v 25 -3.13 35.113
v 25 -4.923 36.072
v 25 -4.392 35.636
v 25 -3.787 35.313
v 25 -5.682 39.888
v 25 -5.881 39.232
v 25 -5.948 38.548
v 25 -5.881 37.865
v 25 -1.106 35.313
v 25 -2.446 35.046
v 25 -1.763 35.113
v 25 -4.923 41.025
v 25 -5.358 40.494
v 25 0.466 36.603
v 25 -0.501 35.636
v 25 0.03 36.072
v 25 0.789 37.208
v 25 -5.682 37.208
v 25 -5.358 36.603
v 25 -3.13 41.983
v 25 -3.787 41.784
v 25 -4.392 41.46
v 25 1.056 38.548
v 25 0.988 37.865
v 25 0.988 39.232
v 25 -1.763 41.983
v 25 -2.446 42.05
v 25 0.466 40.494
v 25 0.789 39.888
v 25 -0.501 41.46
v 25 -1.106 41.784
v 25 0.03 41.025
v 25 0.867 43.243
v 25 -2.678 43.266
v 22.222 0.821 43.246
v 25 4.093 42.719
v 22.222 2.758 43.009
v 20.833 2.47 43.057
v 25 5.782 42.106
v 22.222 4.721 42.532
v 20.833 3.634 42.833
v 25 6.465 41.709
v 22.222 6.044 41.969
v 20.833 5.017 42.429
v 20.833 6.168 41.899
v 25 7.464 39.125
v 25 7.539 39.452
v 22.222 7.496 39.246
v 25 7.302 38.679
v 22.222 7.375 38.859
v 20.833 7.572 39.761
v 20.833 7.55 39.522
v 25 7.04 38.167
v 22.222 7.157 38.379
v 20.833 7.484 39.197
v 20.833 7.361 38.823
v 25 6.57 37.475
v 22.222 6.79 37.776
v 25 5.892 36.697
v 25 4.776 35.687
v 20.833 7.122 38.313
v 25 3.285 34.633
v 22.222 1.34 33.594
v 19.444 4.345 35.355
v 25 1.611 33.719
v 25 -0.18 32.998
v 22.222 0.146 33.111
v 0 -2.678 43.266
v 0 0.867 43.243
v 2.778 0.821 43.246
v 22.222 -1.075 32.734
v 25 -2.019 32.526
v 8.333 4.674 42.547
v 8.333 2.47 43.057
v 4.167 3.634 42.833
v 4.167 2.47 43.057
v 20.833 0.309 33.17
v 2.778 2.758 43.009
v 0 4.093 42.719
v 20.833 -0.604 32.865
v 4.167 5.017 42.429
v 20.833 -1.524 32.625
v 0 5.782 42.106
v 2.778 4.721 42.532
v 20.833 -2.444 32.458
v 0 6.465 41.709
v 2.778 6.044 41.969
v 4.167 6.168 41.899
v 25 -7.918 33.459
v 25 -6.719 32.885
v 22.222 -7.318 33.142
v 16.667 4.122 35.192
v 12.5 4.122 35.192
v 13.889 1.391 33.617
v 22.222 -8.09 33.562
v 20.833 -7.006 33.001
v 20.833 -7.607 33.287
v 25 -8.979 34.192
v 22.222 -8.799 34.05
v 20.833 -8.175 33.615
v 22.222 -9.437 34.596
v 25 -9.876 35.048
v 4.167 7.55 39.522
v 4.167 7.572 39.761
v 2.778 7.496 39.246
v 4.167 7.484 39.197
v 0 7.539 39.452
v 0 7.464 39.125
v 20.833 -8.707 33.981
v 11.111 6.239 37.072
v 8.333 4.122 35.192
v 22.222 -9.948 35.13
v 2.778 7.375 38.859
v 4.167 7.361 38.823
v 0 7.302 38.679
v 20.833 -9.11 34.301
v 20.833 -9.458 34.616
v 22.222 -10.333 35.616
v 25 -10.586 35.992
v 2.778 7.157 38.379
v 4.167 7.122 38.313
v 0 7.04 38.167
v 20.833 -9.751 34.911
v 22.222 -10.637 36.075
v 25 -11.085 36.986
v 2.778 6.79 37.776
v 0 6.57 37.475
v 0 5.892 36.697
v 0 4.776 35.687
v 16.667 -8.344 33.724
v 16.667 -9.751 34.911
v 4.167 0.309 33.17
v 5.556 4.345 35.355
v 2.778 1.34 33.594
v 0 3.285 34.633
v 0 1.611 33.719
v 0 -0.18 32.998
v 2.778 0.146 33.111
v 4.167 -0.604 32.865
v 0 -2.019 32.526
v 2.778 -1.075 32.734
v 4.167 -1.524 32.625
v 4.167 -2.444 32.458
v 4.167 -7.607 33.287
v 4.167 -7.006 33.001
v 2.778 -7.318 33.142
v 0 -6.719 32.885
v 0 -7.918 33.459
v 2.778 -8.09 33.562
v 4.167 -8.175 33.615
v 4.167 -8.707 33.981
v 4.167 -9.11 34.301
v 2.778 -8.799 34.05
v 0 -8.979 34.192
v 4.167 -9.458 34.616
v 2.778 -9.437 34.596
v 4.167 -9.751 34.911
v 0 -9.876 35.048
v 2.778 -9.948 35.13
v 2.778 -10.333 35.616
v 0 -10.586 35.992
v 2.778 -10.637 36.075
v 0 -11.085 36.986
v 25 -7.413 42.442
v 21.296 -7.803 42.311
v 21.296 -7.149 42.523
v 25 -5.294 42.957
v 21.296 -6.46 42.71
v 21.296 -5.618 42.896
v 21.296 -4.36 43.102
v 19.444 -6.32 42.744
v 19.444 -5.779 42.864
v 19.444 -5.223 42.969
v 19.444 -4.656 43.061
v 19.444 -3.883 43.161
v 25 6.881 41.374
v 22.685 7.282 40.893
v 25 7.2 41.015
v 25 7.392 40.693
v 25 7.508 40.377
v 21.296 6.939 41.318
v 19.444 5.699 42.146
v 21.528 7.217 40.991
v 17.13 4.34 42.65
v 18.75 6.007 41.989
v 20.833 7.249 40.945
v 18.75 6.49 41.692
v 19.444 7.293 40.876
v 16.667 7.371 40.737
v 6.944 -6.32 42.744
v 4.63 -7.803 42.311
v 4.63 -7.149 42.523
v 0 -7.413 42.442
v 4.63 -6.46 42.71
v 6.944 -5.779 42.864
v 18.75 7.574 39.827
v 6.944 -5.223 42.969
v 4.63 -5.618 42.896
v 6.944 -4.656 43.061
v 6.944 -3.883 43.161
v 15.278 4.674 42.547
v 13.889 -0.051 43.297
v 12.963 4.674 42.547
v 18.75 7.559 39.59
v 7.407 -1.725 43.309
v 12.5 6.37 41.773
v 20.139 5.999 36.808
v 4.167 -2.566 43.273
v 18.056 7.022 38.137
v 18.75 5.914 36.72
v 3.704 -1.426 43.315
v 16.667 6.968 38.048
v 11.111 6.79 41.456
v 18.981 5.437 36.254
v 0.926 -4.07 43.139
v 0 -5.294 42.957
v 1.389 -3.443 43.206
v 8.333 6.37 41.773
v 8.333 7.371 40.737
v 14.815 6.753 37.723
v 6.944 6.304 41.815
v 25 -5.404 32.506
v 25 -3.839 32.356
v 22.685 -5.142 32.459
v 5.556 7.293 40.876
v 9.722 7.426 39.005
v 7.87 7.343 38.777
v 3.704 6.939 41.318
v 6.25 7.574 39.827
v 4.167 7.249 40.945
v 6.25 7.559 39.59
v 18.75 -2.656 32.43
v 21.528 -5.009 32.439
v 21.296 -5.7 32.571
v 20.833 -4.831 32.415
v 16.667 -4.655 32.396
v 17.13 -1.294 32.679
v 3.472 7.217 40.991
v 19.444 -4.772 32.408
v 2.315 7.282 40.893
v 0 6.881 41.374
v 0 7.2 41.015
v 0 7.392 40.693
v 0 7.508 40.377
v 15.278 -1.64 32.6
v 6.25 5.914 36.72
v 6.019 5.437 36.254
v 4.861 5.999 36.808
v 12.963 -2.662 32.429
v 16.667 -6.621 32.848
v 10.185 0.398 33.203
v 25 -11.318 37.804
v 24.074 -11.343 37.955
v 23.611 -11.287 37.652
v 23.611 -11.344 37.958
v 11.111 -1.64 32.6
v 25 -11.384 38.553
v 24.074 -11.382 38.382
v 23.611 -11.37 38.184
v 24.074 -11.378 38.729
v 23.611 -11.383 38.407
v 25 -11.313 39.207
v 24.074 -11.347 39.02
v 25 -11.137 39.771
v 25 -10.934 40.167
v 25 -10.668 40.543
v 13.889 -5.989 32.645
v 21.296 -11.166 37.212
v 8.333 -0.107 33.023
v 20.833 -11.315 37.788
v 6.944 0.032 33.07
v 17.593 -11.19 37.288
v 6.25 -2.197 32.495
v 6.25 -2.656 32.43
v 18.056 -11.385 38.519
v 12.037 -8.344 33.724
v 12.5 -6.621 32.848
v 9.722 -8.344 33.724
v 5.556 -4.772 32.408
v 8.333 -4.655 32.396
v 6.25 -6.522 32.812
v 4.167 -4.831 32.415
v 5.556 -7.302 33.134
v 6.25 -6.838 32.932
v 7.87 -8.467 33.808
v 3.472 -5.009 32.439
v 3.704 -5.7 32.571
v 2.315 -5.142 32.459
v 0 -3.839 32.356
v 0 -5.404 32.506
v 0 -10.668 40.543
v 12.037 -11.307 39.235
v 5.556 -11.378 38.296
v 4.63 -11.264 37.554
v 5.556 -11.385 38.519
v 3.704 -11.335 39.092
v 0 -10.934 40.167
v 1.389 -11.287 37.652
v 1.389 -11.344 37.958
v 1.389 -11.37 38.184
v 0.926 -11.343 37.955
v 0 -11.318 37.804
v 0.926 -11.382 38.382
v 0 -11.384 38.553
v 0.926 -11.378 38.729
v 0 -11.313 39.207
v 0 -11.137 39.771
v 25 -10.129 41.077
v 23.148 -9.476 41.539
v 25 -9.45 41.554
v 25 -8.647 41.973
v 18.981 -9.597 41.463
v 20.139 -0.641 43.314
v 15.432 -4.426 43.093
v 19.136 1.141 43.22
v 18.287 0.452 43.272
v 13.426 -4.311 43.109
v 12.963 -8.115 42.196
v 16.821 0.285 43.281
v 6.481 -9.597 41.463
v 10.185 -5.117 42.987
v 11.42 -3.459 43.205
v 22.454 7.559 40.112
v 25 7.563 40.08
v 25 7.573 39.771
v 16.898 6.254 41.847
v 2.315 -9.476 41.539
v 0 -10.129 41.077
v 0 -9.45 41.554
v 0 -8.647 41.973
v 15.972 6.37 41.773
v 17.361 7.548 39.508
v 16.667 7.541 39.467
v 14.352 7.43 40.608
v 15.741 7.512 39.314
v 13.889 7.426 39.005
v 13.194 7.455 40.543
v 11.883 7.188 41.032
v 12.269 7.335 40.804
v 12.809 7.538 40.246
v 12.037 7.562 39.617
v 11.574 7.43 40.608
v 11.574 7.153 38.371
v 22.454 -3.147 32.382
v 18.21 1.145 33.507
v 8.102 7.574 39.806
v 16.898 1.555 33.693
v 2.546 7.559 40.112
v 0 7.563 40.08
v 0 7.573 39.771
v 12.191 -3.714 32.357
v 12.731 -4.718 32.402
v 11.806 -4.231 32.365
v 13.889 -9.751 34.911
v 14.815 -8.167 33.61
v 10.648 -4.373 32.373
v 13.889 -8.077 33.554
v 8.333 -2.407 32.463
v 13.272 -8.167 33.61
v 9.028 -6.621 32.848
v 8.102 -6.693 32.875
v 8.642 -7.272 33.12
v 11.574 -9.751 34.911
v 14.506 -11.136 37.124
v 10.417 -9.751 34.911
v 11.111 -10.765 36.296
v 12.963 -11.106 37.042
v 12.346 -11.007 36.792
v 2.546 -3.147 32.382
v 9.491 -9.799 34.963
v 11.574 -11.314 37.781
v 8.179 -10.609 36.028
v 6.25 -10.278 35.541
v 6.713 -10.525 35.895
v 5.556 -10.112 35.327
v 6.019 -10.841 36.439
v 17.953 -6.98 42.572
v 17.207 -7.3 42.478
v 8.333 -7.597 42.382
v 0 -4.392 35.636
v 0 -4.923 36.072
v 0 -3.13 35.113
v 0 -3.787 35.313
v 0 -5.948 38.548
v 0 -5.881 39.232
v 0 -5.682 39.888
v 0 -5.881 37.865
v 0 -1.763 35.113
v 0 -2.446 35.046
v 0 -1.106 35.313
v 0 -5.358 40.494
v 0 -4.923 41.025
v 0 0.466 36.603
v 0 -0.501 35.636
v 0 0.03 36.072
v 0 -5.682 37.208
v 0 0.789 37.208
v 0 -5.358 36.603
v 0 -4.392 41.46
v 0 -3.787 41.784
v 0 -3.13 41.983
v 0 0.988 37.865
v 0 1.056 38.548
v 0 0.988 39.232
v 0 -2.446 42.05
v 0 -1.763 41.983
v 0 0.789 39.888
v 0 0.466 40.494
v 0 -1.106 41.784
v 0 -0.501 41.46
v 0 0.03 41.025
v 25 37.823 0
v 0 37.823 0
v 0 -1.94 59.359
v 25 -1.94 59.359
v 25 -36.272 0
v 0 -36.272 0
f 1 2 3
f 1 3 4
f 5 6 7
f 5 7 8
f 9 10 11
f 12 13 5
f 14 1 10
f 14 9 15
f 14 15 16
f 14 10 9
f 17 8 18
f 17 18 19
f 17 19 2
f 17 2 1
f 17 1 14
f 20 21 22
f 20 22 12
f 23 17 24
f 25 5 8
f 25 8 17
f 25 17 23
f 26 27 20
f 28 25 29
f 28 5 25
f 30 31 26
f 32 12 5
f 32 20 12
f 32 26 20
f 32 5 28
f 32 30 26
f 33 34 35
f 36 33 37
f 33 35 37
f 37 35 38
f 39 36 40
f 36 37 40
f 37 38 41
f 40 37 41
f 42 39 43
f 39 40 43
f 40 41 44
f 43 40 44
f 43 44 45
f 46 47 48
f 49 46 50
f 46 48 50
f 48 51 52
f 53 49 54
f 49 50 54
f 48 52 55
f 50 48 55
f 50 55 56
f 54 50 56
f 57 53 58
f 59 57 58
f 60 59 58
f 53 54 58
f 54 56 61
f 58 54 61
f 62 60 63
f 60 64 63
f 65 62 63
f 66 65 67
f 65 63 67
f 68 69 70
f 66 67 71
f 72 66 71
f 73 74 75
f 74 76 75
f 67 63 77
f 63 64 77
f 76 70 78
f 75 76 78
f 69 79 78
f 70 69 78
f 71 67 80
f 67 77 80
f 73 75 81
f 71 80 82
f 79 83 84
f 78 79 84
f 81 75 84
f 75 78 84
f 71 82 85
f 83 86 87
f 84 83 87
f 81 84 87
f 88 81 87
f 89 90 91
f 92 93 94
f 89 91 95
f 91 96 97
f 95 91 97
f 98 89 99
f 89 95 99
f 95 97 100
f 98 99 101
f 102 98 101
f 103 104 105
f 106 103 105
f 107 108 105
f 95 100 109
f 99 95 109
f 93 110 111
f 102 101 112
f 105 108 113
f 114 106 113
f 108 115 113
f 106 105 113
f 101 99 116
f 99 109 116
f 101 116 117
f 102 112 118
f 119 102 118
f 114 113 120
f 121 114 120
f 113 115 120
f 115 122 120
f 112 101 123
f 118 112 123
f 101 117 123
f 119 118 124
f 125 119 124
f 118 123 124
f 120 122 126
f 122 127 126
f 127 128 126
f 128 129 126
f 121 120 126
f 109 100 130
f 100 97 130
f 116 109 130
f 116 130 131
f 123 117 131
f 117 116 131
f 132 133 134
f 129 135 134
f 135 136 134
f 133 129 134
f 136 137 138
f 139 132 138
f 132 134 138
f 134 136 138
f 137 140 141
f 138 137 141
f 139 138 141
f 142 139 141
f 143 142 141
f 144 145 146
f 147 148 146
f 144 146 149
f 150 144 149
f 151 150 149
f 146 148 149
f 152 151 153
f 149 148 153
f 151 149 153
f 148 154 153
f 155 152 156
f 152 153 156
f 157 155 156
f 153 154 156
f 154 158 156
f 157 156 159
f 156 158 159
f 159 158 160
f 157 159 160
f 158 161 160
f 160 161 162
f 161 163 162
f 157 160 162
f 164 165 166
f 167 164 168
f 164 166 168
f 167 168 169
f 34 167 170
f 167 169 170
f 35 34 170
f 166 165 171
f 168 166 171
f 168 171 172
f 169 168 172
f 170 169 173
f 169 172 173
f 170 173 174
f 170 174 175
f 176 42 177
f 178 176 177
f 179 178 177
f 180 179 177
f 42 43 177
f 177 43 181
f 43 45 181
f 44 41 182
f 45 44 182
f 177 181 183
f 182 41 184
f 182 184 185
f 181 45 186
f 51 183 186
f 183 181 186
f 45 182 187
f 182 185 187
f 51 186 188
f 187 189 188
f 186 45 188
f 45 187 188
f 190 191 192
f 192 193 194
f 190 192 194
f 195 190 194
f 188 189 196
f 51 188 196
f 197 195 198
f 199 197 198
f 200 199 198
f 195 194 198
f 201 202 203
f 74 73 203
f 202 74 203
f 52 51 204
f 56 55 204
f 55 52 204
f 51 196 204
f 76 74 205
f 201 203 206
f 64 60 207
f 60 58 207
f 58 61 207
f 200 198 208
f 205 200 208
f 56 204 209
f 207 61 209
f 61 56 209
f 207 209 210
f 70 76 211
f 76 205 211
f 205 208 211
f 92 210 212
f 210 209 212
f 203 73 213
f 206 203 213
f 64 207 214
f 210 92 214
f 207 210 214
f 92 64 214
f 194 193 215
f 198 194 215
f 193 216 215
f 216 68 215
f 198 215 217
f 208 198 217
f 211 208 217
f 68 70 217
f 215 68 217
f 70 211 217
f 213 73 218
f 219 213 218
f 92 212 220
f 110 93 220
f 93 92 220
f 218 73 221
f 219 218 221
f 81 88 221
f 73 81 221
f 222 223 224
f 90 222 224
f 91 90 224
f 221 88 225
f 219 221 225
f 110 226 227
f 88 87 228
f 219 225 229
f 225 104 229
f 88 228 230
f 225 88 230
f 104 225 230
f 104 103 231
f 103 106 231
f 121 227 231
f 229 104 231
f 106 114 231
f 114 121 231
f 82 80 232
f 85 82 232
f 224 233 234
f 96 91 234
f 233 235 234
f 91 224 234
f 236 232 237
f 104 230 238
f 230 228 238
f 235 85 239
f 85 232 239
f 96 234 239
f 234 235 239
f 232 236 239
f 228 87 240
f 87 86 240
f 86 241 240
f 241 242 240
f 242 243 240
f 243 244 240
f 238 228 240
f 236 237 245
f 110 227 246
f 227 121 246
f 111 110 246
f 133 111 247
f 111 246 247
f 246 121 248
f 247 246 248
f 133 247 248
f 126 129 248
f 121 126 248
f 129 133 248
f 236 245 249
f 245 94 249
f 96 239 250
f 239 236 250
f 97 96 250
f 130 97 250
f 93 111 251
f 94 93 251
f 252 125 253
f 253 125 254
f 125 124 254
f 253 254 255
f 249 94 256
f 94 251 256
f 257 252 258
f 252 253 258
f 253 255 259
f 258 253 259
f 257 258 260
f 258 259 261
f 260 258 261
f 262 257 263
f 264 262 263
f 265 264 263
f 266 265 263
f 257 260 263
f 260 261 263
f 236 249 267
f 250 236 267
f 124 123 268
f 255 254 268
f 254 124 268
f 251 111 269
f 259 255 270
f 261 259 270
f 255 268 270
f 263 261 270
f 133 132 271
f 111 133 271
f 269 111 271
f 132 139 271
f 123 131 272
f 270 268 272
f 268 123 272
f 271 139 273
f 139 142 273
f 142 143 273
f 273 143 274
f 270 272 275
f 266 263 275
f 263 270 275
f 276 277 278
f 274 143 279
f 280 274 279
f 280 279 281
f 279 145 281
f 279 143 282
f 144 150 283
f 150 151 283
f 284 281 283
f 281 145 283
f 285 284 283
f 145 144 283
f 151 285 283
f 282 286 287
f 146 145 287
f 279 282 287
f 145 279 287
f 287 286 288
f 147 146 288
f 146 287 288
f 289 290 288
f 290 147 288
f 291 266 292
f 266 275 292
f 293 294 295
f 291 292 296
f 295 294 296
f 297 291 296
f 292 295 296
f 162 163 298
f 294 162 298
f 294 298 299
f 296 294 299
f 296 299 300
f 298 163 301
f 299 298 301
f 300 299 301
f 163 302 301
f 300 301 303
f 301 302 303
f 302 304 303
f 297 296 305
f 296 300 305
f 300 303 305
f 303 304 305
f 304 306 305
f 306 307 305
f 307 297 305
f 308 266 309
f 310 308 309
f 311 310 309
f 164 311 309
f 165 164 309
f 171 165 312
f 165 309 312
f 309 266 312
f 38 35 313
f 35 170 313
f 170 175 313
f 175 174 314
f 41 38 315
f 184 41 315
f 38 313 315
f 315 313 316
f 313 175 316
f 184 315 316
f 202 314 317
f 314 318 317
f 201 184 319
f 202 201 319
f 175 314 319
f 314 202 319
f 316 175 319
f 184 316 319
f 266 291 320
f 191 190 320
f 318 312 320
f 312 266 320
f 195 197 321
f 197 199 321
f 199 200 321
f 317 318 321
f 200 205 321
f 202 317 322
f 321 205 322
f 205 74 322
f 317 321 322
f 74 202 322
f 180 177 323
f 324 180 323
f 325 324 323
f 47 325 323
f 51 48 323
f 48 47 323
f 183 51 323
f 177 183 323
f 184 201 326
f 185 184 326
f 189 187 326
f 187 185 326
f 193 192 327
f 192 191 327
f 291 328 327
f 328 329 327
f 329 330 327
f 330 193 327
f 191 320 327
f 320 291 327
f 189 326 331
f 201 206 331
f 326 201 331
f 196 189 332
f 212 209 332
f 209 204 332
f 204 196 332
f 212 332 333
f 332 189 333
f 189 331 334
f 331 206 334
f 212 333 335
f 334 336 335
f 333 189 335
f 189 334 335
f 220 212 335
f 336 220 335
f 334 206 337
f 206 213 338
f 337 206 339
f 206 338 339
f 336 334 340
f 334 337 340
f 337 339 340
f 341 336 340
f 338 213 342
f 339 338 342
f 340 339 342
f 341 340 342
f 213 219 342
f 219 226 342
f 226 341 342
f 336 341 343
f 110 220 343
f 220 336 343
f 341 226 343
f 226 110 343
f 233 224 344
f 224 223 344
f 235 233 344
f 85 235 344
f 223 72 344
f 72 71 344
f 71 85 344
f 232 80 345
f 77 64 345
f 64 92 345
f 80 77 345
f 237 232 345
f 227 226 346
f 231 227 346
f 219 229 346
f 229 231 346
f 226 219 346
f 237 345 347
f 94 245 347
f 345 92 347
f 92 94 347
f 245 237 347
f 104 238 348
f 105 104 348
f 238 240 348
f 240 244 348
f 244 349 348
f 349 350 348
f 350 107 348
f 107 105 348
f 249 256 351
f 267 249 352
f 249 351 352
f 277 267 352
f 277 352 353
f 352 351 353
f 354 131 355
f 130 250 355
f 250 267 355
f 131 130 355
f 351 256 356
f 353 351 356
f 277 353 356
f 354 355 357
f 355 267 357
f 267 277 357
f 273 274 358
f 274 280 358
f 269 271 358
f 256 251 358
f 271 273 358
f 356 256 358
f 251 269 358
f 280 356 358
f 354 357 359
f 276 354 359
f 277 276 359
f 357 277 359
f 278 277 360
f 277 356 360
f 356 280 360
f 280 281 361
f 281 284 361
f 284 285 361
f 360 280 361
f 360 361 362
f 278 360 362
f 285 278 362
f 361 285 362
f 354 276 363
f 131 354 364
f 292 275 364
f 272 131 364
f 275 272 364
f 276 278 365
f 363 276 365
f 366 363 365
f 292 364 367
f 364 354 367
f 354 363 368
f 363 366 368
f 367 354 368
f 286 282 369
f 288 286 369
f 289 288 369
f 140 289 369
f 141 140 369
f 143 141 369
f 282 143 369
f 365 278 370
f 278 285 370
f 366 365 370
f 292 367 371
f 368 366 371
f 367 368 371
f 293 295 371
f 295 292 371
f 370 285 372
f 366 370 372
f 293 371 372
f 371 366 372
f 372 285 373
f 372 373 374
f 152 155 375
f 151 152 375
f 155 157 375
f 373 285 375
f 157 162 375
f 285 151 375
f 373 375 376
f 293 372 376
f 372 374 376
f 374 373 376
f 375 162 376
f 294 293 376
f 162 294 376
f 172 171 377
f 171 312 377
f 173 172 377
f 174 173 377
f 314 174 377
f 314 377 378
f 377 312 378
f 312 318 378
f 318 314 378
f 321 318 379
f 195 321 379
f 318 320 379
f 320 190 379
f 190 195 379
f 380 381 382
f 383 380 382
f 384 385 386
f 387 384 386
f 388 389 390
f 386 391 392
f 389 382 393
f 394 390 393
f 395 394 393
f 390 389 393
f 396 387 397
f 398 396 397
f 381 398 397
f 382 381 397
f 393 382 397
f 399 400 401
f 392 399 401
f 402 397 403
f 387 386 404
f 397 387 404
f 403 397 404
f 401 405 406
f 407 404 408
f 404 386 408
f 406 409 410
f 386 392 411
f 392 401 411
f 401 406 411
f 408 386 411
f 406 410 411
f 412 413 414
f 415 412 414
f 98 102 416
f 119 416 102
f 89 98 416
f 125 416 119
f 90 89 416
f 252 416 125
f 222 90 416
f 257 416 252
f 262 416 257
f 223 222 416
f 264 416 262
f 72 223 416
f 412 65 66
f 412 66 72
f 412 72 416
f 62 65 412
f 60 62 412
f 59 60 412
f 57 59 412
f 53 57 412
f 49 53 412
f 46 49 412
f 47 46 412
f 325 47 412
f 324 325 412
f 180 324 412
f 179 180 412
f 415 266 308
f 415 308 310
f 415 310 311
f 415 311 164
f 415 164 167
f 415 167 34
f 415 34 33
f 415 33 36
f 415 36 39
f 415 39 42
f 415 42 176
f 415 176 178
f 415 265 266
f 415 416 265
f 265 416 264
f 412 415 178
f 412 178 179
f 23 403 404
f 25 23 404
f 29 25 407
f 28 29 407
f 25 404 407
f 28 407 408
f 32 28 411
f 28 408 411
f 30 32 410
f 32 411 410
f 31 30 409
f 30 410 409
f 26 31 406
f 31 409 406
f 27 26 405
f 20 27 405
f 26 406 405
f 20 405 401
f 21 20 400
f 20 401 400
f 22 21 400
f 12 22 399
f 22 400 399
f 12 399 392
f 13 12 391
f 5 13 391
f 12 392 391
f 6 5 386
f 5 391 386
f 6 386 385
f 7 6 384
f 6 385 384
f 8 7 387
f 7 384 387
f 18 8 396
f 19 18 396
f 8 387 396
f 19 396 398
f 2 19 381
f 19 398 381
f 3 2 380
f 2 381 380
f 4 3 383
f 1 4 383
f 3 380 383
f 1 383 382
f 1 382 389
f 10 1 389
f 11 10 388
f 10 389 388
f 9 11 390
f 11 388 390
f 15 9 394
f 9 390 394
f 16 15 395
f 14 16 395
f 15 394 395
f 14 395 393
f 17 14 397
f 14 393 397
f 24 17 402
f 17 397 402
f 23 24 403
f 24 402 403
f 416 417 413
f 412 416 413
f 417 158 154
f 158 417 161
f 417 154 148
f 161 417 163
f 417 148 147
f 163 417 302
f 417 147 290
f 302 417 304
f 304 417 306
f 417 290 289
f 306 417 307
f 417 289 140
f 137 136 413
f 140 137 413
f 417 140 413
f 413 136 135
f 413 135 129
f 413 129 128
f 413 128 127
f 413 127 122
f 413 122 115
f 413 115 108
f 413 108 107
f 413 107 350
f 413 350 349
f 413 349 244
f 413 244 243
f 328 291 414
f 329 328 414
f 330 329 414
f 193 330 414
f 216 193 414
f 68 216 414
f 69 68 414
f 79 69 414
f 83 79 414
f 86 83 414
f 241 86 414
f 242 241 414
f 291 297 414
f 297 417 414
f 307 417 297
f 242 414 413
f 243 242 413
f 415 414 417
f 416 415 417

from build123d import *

# Parameters (mm, degrees)
F1_DEPTH = 25
F2_R     = 3.5020969803
F3_DEPTH = 25


with BuildPart() as f1:
    # F0 (on Right) → F1 (new body)
    with BuildSketch(Plane.YZ):
        Polygon((-1.9396552816, 59.3589432538), (-36.2715534866, 0), (37.8232784569, 0), align=None)
        with BuildLine():
            add(Edge.make_bspline(
                [(-10.6681035832, 40.5428297818), (-7.6286068887, 44.2469875954), (17.5783776514, 44.1035182674), (-5.3241676234, 26.984043361), (-12.9452983093, 37.7676701135), (-10.6681035832, 40.5428297818)],
                knots=[0, 0, 0, 0, 0.3773706127, 0.7172734648, 1, 1, 1, 1], degree=3))
        make_face(mode=Mode.SUBTRACT)
    extrude(amount=F1_DEPTH)


with BuildPart() as f3:
    # F2 (on Right) → F3 (new body)
    with BuildSketch(Plane.YZ):
        with Locations((-2.4463732261, 38.5482795537)):
            Circle(F2_R)
    extrude(amount=F3_DEPTH)


solid = Compound([f1.part, f3.part])
